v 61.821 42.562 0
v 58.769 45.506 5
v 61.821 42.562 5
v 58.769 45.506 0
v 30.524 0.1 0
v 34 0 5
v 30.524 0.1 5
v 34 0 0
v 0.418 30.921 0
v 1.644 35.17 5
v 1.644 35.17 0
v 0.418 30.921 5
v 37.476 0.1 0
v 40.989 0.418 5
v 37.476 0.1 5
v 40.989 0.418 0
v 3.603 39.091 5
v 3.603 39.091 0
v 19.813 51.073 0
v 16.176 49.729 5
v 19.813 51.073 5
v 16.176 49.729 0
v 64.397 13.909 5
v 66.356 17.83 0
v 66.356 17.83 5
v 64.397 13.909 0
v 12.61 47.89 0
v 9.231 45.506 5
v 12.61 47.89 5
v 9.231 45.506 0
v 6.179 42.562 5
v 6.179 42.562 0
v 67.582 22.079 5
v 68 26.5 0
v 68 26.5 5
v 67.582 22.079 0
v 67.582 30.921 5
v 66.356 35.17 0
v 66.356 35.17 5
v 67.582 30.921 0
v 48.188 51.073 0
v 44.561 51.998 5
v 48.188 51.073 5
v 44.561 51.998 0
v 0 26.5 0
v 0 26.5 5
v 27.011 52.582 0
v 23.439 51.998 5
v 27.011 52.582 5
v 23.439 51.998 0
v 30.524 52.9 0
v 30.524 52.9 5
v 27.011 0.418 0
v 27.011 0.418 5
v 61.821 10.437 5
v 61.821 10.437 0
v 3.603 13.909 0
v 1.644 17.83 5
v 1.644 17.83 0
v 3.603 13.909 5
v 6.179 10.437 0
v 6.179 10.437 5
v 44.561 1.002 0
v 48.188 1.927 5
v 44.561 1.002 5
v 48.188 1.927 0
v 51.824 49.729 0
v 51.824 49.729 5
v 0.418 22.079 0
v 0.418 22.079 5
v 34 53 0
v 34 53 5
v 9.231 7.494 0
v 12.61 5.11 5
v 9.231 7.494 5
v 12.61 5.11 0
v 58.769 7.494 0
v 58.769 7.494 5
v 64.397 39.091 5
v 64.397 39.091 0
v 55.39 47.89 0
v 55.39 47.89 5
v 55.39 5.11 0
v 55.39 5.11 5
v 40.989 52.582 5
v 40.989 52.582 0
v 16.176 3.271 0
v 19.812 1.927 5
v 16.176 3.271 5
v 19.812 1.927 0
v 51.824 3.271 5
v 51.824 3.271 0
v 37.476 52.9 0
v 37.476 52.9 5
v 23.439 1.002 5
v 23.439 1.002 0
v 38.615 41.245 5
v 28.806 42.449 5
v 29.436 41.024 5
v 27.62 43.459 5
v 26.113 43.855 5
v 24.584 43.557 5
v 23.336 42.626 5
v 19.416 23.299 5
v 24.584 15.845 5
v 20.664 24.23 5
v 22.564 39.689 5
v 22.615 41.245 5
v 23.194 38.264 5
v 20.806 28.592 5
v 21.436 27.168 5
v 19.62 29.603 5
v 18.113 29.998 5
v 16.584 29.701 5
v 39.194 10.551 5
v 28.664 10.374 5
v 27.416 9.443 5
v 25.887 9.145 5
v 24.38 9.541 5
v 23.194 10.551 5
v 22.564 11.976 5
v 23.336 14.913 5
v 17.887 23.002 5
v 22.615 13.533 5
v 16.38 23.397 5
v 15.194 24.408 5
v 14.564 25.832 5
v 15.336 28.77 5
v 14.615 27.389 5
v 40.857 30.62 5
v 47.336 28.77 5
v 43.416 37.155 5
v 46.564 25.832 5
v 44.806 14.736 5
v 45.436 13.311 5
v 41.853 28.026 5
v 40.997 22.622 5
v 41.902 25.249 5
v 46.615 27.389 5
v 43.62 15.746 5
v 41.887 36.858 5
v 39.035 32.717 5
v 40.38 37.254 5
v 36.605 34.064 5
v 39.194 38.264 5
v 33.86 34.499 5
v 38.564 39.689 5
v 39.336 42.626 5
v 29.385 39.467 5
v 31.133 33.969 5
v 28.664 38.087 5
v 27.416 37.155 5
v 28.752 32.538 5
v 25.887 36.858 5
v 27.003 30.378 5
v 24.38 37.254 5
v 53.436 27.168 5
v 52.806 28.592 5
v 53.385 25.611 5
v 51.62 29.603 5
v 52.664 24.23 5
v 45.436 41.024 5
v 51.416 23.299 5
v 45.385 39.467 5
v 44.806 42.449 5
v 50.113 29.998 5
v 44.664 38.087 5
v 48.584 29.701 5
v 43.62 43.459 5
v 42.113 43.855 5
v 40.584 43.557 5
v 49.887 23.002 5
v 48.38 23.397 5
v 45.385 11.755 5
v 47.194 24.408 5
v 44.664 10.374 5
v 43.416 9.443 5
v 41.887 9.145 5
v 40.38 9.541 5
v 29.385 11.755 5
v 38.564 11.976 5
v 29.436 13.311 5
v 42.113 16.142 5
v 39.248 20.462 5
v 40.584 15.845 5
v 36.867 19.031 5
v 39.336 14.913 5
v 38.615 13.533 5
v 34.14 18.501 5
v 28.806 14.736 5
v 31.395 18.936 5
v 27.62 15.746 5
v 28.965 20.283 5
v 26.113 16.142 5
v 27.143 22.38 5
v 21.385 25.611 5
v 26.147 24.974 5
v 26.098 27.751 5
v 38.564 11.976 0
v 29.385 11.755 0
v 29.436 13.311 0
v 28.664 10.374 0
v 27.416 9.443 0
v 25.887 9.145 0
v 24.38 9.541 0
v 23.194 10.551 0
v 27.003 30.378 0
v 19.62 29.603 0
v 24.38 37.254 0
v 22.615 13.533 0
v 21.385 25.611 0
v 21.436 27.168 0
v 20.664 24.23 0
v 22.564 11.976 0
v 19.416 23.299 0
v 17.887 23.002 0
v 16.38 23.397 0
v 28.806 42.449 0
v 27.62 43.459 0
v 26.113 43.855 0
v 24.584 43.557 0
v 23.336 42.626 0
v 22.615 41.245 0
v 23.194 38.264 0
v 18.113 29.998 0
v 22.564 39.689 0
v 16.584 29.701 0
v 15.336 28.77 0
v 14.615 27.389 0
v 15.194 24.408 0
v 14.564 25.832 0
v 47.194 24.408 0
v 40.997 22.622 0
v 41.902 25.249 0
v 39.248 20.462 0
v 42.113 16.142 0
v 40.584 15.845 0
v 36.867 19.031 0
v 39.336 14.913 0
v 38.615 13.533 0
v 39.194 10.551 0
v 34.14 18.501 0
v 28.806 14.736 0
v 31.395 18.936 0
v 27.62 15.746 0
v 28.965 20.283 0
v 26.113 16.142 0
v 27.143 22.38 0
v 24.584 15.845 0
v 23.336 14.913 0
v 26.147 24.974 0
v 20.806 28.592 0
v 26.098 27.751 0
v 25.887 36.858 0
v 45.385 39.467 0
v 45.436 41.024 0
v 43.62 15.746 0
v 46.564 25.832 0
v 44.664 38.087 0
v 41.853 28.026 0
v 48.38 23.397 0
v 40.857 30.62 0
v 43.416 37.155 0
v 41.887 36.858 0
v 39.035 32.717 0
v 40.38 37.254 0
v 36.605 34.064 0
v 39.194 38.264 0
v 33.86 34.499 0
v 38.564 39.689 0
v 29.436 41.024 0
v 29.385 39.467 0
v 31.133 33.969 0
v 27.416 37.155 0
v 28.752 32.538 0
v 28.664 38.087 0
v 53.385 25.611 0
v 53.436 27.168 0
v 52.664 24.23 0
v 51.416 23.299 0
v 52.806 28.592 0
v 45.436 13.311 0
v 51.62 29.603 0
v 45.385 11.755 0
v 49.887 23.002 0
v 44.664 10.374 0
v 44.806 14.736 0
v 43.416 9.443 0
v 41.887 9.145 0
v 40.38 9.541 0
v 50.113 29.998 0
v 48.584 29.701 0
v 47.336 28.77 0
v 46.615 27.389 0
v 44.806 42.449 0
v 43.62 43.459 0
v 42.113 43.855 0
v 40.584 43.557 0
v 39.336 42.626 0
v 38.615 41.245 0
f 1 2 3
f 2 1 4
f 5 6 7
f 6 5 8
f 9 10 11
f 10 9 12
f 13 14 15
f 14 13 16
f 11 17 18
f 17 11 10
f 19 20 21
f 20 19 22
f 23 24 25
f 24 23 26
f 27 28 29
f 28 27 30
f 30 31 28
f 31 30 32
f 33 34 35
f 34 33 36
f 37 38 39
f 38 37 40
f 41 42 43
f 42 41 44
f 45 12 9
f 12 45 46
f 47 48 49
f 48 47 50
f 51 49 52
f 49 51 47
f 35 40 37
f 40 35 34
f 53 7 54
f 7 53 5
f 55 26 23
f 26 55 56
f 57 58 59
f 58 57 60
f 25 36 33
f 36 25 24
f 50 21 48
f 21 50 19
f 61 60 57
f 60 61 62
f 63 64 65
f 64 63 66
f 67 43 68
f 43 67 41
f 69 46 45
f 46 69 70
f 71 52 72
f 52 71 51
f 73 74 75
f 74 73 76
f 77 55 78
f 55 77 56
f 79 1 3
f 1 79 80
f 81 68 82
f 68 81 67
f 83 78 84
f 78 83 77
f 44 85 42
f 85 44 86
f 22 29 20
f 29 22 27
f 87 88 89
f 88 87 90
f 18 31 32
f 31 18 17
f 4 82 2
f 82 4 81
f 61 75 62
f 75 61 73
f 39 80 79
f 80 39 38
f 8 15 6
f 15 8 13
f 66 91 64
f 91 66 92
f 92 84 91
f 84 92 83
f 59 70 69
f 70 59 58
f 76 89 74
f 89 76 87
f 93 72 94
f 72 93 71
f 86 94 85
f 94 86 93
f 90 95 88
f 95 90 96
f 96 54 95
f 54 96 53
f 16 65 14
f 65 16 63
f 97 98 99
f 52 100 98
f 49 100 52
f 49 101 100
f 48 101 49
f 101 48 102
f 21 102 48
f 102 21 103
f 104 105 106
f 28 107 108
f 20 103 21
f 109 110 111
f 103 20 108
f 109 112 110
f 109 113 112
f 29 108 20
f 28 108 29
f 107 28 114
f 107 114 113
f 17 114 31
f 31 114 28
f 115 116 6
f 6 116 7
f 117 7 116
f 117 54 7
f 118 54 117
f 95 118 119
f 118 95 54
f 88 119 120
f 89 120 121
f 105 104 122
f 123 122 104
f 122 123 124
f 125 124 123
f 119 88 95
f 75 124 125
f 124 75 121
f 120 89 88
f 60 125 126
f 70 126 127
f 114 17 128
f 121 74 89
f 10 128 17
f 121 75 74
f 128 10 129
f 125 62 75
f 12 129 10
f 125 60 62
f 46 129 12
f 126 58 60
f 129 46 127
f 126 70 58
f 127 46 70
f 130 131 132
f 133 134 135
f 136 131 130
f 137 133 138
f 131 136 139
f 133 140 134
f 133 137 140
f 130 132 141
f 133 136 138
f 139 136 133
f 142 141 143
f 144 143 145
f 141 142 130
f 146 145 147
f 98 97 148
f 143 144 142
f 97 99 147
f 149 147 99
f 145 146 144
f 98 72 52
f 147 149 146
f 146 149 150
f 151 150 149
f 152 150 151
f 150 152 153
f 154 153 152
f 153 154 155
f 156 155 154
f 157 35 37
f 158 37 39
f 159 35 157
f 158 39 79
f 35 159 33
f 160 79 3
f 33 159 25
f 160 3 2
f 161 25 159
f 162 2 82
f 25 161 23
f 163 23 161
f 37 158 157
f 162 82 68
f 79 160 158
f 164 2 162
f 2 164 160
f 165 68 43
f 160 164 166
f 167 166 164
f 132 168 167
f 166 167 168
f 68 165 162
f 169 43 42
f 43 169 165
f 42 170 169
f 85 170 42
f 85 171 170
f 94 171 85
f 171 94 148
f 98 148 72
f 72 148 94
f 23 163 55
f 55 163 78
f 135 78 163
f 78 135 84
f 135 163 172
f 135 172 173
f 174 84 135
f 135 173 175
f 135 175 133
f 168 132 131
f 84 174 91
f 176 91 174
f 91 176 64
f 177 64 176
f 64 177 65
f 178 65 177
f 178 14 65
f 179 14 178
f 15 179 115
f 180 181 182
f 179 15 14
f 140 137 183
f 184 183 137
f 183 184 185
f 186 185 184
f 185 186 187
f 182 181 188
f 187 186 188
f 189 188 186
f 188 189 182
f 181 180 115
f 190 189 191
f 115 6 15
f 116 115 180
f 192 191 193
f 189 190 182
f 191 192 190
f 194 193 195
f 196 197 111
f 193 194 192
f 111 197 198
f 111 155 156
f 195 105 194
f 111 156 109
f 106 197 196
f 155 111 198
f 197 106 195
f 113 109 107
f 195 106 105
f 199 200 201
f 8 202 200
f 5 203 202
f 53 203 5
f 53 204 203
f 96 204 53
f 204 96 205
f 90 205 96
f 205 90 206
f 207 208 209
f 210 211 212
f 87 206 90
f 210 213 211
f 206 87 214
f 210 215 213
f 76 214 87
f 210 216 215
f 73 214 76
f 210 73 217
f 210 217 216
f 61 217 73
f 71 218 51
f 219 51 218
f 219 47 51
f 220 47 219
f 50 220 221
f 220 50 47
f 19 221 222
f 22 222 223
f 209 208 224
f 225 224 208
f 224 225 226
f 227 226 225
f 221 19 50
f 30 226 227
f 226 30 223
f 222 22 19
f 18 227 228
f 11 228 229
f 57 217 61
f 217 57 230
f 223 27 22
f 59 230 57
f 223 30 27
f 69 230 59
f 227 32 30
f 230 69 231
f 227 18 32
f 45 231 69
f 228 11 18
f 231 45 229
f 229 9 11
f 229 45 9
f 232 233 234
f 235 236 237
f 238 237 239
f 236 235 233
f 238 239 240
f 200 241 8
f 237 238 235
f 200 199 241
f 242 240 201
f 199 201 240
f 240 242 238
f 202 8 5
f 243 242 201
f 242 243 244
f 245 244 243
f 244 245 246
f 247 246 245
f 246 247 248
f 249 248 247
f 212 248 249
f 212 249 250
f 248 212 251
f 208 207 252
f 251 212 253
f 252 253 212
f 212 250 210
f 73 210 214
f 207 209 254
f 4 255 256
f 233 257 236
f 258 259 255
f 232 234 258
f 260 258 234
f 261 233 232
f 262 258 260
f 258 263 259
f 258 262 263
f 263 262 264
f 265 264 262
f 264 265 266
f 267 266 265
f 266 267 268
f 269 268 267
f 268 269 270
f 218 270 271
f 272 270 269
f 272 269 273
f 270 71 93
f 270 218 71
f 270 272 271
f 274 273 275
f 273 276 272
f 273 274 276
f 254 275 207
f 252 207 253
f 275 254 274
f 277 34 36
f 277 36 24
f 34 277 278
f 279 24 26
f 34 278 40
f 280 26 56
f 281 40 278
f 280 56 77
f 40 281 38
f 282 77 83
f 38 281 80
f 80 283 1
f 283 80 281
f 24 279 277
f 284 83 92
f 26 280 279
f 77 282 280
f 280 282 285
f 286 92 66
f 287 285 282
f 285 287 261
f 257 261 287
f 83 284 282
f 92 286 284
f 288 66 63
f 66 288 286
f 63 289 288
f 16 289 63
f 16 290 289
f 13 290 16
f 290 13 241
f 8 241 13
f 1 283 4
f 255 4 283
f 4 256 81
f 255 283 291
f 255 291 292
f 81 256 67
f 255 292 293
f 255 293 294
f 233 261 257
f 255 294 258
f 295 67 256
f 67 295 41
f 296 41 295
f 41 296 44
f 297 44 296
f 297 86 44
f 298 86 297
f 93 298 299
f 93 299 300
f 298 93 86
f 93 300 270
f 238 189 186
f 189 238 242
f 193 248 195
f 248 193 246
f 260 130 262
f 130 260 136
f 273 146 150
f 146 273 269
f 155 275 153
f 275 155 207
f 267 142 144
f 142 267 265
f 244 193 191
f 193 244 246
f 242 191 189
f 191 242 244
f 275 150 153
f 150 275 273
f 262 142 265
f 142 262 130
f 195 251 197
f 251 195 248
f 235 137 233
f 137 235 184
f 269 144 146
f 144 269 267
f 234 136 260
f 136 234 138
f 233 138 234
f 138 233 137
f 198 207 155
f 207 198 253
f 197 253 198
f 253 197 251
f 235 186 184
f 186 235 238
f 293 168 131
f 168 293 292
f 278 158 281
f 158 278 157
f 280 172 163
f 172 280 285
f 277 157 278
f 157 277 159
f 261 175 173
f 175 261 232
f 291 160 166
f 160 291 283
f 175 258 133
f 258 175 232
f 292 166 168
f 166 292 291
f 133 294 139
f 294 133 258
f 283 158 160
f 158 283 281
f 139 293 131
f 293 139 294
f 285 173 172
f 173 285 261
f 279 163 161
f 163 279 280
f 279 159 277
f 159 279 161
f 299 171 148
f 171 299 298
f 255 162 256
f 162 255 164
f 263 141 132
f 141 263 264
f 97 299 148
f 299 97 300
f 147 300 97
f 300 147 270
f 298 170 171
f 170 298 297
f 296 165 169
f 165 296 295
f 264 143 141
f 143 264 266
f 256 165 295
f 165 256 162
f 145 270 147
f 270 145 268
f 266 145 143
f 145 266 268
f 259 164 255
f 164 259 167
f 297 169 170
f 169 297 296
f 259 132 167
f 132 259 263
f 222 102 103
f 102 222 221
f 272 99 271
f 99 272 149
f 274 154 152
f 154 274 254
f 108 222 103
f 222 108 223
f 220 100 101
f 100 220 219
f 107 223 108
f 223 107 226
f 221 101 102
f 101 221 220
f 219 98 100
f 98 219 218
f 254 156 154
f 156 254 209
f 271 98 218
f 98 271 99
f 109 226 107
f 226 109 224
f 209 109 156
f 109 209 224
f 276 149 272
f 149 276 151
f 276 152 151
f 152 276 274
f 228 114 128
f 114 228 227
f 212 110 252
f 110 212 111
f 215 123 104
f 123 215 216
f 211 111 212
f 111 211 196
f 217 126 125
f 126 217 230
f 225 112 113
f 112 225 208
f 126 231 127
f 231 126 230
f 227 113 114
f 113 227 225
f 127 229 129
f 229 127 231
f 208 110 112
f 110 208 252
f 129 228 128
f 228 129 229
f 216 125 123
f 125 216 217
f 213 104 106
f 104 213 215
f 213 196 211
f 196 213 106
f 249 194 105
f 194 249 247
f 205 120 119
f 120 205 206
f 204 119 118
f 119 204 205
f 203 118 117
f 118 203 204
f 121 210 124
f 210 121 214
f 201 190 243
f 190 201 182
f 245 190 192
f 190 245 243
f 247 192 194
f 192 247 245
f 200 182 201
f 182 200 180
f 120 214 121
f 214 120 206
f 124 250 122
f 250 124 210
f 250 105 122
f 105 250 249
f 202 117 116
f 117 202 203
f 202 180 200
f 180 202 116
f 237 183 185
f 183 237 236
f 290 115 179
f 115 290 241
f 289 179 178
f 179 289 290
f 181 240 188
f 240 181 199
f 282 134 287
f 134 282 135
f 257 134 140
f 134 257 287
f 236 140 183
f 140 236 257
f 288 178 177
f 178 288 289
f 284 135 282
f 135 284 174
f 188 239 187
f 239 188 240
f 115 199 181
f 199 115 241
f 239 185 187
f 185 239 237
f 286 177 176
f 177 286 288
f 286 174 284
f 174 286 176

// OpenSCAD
$fn = 32;

// ----------------------------------------------------------------------
// Cam plate: double_lobe cam, base R24
// ----------------------------------------------------------------------

// --- parameters (mm) ---
base_r = 24;              // base circle radius
lobe_h = 10;              // cam lobe rise
bore_r = 8;               // shaft bore radius
plate_t = 5;              // plate thickness, Z (extrusion height)
ring_r = 16;              // lightening ring radius
bolt_r = 3.5;             // lightening hole radius

profile = [[68, 26.5], [67.582, 30.921], [66.356, 35.17], [64.397, 39.091], [61.821, 42.562], [58.769, 45.506], [55.39, 47.89], [51.824, 49.729], [48.188, 51.073], [44.561, 51.998], [40.989, 52.582], [37.476, 52.9], [34, 53], [30.524, 52.9], [27.011, 52.582], [23.439, 51.998], [19.813, 51.073], [16.176, 49.729], [12.61, 47.89], [9.231, 45.506], [6.179, 42.562], [3.603, 39.091], [1.644, 35.17], [0.418, 30.921], [0, 26.5], [0.418, 22.079], [1.644, 17.83], [3.603, 13.909], [6.179, 10.437], [9.231, 7.494], [12.61, 5.11], [16.176, 3.271], [19.812, 1.927], [23.439, 1.002], [27.011, 0.418], [30.524, 0.1], [34, 0], [37.476, 0.1], [40.989, 0.418], [44.561, 1.002], [48.188, 1.927], [51.824, 3.271], [55.39, 5.11], [58.769, 7.494], [61.821, 10.437], [64.397, 13.909], [66.356, 17.83], [67.582, 22.079]];  // primary outline, 48 points, counter clockwise
void_1 = [[41.853, 28.026], [40.857, 30.62], [39.035, 32.717], [36.605, 34.064], [33.86, 34.499], [31.133, 33.969], [28.752, 32.538], [27.003, 30.378], [26.098, 27.751], [26.147, 24.974], [27.143, 22.38], [28.965, 20.283], [31.395, 18.936], [34.14, 18.501], [36.867, 19.031], [39.248, 20.462], [40.997, 22.622], [41.902, 25.249]];  // shaft bore, 18 points
void_2 = [[53.436, 27.168], [52.806, 28.592], [51.62, 29.603], [50.113, 29.998], [48.584, 29.701], [47.336, 28.77], [46.615, 27.389], [46.564, 25.832], [47.194, 24.408], [48.38, 23.397], [49.887, 23.002], [51.416, 23.299], [52.664, 24.23], [53.385, 25.611]];  // lightening hole 1, 14 points
void_3 = [[45.436, 41.024], [44.806, 42.449], [43.62, 43.459], [42.113, 43.855], [40.584, 43.557], [39.336, 42.626], [38.615, 41.245], [38.564, 39.689], [39.194, 38.264], [40.38, 37.254], [41.887, 36.858], [43.416, 37.155], [44.664, 38.087], [45.385, 39.467]];  // lightening hole 2, 14 points
void_4 = [[29.436, 41.024], [28.806, 42.449], [27.62, 43.459], [26.113, 43.855], [24.584, 43.557], [23.336, 42.626], [22.615, 41.245], [22.564, 39.689], [23.194, 38.264], [24.38, 37.254], [25.887, 36.858], [27.416, 37.155], [28.664, 38.087], [29.385, 39.467]];  // lightening hole 3, 14 points
void_5 = [[21.436, 27.168], [20.806, 28.592], [19.62, 29.603], [18.113, 29.998], [16.584, 29.701], [15.336, 28.77], [14.615, 27.389], [14.564, 25.832], [15.194, 24.408], [16.38, 23.397], [17.887, 23.002], [19.416, 23.299], [20.664, 24.23], [21.385, 25.611]];  // lightening hole 4, 14 points
void_6 = [[29.436, 13.311], [28.806, 14.736], [27.62, 15.746], [26.113, 16.142], [24.584, 15.845], [23.336, 14.913], [22.615, 13.533], [22.564, 11.976], [23.194, 10.551], [24.38, 9.541], [25.887, 9.145], [27.416, 9.443], [28.664, 10.374], [29.385, 11.755]];  // lightening hole 5, 14 points
void_7 = [[45.436, 13.311], [44.806, 14.736], [43.62, 15.746], [42.113, 16.142], [40.584, 15.845], [39.336, 14.913], [38.615, 13.533], [38.564, 11.976], [39.194, 10.551], [40.38, 9.541], [41.887, 9.145], [43.416, 9.443], [44.664, 10.374], [45.385, 11.755]];  // lightening hole 6, 14 points

// --- the one profile operation ---
difference() {
  linear_extrude(height = plate_t) polygon(points = profile);
  translate([0, 0, -1])
    linear_extrude(height = plate_t + 2) polygon(points = void_1);
  translate([0, 0, -1])
    linear_extrude(height = plate_t + 2) polygon(points = void_2);
  translate([0, 0, -1])
    linear_extrude(height = plate_t + 2) polygon(points = void_3);
  translate([0, 0, -1])
    linear_extrude(height = plate_t + 2) polygon(points = void_4);
  translate([0, 0, -1])
    linear_extrude(height = plate_t + 2) polygon(points = void_5);
  translate([0, 0, -1])
    linear_extrude(height = plate_t + 2) polygon(points = void_6);
  translate([0, 0, -1])
    linear_extrude(height = plate_t + 2) polygon(points = void_7);
}
